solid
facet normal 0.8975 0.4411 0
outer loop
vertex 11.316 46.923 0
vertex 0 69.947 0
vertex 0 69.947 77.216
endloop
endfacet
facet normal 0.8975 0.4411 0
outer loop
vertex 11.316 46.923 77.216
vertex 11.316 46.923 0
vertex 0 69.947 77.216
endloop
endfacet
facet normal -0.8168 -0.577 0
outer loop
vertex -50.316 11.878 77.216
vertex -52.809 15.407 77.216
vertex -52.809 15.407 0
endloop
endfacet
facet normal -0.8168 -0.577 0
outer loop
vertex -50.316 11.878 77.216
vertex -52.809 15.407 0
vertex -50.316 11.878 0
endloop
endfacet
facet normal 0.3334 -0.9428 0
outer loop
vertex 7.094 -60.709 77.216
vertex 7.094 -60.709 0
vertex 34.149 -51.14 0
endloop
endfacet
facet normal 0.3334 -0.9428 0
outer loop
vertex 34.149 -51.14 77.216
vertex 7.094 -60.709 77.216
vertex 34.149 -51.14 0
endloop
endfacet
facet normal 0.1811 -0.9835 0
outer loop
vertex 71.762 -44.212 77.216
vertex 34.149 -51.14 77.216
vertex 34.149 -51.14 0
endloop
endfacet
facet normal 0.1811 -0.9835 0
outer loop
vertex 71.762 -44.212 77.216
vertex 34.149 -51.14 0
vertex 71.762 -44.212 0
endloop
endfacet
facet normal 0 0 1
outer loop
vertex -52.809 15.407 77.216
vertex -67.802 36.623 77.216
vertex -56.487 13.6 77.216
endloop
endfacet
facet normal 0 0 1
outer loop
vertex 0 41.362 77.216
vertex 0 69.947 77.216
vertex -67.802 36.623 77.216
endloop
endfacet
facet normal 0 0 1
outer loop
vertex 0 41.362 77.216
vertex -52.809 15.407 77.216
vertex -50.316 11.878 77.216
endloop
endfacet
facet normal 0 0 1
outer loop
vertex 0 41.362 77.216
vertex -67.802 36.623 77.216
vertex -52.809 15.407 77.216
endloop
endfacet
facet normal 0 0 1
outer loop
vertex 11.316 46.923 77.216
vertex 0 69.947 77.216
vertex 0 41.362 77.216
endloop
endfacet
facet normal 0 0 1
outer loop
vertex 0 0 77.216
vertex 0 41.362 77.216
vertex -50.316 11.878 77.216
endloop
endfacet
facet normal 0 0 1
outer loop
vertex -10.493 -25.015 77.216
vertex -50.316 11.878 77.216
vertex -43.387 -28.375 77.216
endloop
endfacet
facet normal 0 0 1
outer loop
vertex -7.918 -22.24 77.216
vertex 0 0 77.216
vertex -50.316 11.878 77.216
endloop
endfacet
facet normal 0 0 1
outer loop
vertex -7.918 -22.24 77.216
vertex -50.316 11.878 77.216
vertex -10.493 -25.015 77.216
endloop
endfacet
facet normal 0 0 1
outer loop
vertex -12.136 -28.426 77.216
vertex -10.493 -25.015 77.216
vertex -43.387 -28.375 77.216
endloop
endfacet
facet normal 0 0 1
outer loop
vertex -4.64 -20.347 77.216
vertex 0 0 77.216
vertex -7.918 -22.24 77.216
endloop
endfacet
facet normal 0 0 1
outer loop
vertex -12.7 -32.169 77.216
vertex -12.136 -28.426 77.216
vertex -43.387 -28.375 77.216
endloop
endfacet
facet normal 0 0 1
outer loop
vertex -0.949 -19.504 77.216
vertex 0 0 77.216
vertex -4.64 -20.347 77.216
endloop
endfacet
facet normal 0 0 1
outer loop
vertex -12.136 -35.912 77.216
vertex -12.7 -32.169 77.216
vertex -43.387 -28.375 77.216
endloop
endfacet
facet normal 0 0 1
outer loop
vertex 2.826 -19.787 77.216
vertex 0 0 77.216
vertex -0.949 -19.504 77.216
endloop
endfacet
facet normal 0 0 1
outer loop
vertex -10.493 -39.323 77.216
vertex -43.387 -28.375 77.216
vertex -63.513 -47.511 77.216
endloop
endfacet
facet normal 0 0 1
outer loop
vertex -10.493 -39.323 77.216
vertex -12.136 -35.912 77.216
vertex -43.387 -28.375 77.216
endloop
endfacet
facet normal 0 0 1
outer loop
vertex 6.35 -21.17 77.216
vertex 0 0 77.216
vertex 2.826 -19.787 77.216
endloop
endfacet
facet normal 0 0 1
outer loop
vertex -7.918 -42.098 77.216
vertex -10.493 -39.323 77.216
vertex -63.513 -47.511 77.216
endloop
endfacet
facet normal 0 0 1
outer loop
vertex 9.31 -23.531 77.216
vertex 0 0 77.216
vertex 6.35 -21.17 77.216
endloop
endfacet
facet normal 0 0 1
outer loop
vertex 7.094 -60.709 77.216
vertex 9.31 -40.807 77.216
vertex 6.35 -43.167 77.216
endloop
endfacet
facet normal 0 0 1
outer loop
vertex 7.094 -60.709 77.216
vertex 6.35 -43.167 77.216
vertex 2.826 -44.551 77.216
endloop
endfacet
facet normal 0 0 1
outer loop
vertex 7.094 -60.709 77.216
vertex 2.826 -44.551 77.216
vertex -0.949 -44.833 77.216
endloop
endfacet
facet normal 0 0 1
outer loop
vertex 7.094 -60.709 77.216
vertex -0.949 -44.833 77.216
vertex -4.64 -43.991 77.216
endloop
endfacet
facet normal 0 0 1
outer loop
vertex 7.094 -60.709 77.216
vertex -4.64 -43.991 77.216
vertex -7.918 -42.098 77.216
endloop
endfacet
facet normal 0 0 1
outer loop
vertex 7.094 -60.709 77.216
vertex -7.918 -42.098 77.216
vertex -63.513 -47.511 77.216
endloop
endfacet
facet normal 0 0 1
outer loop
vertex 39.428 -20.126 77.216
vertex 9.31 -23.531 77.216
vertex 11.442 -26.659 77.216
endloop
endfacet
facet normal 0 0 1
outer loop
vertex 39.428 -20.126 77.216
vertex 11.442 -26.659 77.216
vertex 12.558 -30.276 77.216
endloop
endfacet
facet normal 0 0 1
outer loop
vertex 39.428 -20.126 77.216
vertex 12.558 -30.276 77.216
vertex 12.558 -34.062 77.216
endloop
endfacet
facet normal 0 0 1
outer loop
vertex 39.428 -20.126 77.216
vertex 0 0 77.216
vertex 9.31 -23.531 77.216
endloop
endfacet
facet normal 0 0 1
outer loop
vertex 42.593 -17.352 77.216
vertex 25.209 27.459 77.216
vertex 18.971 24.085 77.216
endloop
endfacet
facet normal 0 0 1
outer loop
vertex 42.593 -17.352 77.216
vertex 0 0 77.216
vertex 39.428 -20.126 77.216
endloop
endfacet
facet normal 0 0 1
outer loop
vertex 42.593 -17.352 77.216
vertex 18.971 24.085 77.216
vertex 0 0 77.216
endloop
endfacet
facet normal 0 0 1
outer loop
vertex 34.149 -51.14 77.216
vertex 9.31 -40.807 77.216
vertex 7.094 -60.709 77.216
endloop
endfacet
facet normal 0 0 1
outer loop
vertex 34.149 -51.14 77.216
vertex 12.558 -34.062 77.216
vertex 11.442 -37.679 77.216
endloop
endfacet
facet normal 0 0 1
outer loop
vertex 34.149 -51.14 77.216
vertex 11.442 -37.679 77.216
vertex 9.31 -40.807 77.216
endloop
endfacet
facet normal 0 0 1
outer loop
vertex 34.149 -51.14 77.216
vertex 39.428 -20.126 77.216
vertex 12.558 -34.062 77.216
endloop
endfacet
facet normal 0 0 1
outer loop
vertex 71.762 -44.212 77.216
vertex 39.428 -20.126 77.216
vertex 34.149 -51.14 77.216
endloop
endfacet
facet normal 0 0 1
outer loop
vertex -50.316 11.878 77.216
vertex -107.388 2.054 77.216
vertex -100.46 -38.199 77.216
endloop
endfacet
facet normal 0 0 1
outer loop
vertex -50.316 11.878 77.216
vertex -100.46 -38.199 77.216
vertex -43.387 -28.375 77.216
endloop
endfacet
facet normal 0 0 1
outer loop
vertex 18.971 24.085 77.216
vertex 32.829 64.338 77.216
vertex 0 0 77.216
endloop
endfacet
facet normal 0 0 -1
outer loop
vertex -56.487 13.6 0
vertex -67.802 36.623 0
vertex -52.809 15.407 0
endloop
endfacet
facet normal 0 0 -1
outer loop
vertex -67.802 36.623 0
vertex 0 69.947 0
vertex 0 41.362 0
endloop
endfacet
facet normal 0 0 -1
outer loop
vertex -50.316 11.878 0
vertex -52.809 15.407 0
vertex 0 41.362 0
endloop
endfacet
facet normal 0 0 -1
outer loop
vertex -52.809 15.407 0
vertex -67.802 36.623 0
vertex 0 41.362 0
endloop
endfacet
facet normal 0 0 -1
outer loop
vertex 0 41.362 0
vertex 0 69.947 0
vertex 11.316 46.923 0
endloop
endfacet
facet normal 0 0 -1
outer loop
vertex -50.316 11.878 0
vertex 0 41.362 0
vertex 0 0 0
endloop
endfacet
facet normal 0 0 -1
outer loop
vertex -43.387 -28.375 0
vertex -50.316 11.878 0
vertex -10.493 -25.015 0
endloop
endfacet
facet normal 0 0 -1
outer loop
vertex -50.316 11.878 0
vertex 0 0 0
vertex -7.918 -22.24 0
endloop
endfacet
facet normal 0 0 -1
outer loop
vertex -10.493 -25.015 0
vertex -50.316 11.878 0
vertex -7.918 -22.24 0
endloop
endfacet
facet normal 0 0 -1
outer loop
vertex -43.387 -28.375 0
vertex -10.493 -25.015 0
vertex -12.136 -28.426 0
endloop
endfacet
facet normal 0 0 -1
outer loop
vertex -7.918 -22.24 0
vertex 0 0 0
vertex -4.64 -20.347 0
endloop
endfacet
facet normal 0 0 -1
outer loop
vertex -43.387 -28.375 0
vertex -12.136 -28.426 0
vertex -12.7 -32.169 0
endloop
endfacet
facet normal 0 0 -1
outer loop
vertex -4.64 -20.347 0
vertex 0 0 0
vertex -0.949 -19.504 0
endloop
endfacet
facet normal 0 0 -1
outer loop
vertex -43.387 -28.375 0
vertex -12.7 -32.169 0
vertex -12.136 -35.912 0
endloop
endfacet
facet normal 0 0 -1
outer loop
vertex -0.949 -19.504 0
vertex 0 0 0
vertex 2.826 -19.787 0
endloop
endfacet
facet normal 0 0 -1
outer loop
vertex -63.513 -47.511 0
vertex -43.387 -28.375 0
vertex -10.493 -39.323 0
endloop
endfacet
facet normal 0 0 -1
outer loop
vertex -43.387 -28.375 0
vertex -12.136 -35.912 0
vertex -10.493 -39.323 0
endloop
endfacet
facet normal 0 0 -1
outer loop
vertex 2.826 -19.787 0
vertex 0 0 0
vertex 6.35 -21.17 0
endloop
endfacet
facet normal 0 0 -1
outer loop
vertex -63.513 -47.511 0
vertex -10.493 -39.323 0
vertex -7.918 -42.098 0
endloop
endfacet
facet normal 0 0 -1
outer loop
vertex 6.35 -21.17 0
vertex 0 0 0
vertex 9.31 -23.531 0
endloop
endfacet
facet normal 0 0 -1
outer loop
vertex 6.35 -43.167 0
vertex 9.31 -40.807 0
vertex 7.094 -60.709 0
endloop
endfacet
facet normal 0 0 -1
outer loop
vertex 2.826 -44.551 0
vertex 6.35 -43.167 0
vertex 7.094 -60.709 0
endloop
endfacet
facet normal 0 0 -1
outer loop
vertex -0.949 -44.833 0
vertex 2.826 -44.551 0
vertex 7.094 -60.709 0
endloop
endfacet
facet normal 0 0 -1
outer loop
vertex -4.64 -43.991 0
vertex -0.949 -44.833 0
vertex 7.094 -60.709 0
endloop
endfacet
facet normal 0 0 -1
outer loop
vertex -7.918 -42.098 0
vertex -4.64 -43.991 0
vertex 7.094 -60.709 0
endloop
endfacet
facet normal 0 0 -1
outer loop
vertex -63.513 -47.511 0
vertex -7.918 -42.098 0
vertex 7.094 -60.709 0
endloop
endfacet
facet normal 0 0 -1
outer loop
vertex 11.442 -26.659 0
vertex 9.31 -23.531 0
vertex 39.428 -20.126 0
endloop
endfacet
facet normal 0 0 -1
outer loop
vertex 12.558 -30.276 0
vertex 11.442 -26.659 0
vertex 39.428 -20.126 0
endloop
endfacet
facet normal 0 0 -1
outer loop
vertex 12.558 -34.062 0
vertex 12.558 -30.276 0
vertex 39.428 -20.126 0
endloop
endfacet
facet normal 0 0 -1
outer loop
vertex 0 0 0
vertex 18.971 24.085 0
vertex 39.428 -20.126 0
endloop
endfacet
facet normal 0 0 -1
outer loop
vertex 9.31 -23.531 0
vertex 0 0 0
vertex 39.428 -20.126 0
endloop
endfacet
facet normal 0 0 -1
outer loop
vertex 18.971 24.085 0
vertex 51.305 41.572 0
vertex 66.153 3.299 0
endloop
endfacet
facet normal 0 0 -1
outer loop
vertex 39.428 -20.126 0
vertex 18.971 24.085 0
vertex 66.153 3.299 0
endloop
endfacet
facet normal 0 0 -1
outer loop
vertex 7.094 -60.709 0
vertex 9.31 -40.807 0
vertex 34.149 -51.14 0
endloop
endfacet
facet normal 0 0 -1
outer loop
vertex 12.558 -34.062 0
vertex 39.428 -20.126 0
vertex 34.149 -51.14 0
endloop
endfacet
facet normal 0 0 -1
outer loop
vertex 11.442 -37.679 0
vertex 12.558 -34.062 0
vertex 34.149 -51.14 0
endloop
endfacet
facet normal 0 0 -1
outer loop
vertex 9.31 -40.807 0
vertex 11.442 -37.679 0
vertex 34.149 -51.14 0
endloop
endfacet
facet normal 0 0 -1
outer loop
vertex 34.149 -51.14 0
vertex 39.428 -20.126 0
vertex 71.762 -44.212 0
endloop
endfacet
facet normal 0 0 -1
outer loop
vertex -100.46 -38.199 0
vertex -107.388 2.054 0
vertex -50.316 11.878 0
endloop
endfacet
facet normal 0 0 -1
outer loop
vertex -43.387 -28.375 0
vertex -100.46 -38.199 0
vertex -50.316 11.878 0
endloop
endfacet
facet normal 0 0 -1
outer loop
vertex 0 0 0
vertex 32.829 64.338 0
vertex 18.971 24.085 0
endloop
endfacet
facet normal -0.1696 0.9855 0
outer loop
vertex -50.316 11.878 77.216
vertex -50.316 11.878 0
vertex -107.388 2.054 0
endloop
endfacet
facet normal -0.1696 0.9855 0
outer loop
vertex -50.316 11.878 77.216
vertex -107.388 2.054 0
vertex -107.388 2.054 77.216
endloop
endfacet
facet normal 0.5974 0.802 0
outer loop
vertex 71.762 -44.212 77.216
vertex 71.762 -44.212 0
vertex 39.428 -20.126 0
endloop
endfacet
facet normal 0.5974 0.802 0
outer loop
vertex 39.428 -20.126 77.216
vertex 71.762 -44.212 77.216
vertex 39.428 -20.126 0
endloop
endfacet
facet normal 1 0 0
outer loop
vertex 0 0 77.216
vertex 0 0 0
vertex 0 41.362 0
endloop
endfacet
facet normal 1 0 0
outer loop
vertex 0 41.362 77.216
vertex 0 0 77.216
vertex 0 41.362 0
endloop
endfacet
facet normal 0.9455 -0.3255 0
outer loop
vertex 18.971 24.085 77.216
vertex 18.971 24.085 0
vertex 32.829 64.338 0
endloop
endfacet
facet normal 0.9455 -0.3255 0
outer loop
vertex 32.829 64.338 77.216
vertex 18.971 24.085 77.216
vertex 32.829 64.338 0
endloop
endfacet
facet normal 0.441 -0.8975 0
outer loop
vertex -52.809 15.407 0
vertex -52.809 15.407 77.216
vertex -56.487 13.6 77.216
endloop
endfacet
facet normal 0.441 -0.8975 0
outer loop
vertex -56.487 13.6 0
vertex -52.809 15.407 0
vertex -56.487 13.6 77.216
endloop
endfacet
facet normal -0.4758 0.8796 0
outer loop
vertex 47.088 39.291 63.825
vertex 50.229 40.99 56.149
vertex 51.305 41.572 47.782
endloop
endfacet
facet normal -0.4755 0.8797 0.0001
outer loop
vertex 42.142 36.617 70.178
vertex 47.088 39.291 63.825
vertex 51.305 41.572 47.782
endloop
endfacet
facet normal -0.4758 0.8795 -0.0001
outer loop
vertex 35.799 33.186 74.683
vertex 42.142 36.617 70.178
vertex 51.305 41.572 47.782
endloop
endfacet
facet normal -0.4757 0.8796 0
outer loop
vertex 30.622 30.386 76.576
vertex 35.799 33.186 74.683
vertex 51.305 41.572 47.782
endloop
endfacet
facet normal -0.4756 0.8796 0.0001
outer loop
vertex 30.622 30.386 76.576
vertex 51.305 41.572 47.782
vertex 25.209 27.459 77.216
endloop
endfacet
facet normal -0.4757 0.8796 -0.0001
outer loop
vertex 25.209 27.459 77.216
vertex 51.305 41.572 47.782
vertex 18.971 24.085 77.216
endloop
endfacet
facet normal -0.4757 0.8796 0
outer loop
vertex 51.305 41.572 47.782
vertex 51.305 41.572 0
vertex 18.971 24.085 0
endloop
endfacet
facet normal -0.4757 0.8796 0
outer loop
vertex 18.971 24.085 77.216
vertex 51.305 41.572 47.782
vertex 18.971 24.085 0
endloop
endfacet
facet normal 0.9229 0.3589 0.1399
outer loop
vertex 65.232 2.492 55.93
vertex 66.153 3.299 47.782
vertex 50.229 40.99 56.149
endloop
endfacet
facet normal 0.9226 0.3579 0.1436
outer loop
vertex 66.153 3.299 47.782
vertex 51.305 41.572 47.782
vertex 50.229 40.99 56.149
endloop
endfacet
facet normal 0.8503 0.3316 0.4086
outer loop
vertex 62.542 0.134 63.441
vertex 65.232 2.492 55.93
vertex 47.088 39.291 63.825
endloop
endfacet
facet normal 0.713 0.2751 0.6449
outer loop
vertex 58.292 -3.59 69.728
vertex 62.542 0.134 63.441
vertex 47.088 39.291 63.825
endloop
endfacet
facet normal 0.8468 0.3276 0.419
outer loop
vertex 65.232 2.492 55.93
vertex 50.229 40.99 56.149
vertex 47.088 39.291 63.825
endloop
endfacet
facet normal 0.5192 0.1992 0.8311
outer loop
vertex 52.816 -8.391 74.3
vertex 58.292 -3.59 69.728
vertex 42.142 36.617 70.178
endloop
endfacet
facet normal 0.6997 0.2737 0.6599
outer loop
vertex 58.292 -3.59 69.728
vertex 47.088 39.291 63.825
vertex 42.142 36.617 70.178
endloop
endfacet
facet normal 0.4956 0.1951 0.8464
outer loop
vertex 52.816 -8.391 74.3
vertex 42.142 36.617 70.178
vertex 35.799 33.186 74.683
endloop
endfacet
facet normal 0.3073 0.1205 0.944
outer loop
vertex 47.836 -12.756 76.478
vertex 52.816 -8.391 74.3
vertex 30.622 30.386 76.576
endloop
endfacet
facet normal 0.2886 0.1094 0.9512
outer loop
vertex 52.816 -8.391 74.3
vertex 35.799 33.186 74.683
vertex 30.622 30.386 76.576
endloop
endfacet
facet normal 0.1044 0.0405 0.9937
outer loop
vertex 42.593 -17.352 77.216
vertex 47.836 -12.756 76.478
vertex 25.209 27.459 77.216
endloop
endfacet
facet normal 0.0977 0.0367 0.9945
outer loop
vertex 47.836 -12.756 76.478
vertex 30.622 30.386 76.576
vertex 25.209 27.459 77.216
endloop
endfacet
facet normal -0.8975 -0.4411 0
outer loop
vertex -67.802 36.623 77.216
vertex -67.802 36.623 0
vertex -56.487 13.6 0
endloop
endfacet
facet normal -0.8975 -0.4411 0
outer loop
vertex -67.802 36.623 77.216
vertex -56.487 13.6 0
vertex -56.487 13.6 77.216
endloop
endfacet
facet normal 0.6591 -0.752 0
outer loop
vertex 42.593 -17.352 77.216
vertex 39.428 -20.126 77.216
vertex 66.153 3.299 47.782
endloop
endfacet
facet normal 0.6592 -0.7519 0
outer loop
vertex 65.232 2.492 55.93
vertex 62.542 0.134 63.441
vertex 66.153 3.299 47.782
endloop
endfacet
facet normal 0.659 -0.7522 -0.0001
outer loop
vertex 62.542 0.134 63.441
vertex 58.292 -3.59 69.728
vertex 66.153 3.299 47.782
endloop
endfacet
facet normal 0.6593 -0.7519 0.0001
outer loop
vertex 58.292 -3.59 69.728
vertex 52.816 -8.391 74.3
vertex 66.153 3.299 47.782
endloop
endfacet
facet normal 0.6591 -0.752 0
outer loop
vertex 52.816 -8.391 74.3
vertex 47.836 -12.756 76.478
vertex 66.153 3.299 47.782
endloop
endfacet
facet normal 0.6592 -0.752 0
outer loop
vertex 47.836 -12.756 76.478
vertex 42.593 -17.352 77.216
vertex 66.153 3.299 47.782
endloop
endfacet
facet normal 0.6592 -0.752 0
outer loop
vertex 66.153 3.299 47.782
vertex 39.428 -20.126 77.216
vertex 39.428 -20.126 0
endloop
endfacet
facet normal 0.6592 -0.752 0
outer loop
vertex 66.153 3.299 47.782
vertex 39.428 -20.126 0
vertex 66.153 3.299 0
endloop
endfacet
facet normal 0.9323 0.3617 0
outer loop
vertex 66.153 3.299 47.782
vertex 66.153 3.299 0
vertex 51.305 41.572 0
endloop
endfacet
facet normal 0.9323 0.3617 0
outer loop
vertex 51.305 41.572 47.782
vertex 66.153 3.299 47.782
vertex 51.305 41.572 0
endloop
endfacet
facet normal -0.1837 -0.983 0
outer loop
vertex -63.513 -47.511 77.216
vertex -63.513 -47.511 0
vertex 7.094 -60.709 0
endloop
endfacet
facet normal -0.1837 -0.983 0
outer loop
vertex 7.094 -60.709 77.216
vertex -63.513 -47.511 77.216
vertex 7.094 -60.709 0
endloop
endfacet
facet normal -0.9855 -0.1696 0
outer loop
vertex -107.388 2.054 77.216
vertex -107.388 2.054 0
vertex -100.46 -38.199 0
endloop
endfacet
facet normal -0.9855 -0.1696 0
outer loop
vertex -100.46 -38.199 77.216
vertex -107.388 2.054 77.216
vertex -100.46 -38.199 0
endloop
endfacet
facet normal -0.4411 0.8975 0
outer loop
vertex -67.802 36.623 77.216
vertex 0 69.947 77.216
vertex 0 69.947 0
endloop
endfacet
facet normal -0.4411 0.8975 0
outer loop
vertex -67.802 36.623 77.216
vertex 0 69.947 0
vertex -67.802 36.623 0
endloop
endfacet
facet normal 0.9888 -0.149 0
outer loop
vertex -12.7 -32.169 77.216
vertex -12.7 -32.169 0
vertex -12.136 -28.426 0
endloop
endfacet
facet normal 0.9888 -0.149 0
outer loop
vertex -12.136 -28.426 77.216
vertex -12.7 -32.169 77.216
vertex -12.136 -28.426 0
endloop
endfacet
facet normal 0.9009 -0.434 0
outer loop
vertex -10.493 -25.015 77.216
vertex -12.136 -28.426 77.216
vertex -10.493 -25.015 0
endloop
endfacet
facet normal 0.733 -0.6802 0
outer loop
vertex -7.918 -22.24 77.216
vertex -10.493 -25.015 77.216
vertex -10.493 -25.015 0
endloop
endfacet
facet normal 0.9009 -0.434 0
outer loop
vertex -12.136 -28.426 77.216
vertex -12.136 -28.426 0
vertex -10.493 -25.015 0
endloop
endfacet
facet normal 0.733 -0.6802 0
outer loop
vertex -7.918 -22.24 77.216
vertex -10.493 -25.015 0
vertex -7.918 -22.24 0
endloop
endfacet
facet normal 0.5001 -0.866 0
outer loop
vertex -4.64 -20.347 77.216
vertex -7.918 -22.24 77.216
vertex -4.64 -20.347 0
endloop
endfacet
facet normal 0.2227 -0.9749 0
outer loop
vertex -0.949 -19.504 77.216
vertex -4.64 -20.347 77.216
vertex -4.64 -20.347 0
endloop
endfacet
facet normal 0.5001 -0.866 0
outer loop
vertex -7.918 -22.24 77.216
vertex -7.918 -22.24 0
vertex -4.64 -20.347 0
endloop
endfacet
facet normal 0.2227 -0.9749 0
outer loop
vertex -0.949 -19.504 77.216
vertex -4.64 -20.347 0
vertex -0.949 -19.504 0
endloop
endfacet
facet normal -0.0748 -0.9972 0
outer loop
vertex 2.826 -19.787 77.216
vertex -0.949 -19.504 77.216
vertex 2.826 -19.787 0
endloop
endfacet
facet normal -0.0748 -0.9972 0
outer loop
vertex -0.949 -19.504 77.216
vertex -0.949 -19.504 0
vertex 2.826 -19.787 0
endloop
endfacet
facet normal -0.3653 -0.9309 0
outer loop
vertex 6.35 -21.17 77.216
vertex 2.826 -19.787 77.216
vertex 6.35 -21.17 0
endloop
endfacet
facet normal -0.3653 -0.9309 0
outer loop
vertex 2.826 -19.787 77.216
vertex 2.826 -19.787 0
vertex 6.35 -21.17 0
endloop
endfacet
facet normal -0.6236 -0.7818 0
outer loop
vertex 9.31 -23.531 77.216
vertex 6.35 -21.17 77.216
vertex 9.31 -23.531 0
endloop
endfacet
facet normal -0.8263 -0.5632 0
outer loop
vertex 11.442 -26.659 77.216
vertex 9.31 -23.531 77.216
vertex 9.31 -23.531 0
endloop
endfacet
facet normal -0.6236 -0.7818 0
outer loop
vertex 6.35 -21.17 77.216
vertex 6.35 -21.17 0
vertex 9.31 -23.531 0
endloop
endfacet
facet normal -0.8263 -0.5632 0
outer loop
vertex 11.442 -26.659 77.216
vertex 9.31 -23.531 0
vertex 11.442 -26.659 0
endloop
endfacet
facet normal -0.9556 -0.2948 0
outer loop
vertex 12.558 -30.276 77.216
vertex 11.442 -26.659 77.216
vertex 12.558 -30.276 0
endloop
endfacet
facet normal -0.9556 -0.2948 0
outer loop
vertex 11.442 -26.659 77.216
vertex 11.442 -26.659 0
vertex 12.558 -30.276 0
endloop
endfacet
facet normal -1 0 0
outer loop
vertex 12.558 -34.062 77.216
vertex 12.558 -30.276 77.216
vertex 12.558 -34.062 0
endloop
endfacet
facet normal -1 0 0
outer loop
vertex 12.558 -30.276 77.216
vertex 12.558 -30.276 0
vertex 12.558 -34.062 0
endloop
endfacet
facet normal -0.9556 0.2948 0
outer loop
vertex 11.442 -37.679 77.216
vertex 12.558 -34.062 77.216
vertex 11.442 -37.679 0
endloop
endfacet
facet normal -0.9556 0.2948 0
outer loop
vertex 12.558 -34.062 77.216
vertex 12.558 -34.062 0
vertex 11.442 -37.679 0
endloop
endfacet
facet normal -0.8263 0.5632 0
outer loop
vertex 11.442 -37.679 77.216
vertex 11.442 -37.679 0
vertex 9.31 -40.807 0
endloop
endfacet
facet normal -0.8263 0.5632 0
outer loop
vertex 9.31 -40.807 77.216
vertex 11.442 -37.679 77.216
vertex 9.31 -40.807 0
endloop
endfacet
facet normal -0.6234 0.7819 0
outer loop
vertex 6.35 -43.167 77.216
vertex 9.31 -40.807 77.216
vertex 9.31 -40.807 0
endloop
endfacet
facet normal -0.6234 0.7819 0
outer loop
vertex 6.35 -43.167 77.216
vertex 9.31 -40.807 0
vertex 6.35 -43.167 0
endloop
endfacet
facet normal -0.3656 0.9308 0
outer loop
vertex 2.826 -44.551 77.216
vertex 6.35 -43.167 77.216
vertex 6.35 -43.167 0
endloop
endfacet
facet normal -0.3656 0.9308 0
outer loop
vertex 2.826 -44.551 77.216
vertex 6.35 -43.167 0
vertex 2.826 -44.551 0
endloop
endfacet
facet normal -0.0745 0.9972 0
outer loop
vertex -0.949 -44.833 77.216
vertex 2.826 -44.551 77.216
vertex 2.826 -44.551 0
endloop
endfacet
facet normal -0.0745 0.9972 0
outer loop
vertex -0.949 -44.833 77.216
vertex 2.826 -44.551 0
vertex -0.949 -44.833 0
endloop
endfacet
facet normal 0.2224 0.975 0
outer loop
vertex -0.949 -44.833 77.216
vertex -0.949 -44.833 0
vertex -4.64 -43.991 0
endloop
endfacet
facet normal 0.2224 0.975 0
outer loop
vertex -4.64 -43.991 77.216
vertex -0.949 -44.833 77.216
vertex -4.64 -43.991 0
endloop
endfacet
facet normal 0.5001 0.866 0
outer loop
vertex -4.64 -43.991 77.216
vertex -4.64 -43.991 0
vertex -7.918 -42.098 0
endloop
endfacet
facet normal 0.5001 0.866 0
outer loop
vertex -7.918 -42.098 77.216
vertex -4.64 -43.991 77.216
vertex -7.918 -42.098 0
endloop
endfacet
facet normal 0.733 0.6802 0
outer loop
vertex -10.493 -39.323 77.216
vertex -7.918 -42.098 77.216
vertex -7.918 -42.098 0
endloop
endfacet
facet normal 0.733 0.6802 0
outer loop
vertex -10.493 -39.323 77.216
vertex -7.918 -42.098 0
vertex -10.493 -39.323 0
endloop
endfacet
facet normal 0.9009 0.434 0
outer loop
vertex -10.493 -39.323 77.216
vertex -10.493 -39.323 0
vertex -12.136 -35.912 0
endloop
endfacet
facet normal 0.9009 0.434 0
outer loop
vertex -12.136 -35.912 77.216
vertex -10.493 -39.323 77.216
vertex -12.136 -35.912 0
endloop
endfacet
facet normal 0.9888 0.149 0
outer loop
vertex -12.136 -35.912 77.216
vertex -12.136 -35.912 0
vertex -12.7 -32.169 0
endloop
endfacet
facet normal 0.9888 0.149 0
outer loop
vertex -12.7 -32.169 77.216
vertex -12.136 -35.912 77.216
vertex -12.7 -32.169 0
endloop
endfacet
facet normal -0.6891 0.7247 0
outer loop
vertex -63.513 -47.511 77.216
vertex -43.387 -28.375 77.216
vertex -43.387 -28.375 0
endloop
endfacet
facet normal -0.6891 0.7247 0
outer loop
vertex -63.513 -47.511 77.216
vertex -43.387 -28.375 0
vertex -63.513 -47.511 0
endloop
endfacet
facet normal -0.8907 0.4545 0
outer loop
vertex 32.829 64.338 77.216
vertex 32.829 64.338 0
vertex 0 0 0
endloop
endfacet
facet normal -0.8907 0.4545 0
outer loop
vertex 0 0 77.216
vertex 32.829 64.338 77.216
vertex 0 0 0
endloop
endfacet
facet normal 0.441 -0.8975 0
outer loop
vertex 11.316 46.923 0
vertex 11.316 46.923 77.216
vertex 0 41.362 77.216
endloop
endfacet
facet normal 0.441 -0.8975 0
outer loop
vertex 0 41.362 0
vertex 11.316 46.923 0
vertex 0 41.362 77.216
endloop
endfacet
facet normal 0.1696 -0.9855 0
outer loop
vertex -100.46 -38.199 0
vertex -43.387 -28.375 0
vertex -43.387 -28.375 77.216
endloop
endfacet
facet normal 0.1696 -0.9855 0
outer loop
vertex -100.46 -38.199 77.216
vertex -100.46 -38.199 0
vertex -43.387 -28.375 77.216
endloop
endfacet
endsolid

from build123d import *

# Parameters (mm, degrees)
F1_DEPTH = 77.216
F2_R     = 29.4340917525
F4_D     = 25.4
F5_DEPTH = 25.654
F6_DEPTH = 57.912


with BuildPart() as f1:
    # F0 (on Top) → F1 (new body)
    with BuildSketch(Plane.XY):
        Polygon((32.8288413584, 64.337939024), (0, 0), (0, 69.9468851089), (-67.8022876382, 36.6231352091), (-50.315566361, 11.8777733296), (-43.3868691325, -28.3746812493), (-63.5130926967, -47.5110933185), (7.0936689153, -60.7086196542), (34.1485999525, -51.1404126883), (71.7615485191, -44.2117117345), (39.4276119769, -20.1262254268), (66.1525949836, 3.2993813511), (51.3053834438, 41.5722057223), (18.9714413136, 24.0854844451), align=None)
    extrude(amount=F1_DEPTH)

    # F2
    f2_edges = [f1.edges().sort_by_distance(p)[0] for p in [
        (58.728989, 22.435794, 77.216),
    ]]
    fillet(f2_edges, radius=F2_R)

    # F4 (through all)
    with Locations(Plane.XY.offset(77.216)):
        with Locations((0, -32.1689685807)):
            Hole(F4_D / 2)

    # F5 (add): a face of the model
    f5_faces = [f1.faces().sort_by_distance(p)[0] for p in [
        (-33.9011438191, 53.285010159, 38.608),
    ]]
    extrude(f5_faces, amount=-F5_DEPTH)

    # F6 (add): a face of the model
    f6_faces = [f1.faces().sort_by_distance(p)[0] for p in [
        (-46.8512177467, -8.2484539598, 38.608),
    ]]
    extrude(f6_faces, amount=F6_DEPTH)


solid = f1.part
